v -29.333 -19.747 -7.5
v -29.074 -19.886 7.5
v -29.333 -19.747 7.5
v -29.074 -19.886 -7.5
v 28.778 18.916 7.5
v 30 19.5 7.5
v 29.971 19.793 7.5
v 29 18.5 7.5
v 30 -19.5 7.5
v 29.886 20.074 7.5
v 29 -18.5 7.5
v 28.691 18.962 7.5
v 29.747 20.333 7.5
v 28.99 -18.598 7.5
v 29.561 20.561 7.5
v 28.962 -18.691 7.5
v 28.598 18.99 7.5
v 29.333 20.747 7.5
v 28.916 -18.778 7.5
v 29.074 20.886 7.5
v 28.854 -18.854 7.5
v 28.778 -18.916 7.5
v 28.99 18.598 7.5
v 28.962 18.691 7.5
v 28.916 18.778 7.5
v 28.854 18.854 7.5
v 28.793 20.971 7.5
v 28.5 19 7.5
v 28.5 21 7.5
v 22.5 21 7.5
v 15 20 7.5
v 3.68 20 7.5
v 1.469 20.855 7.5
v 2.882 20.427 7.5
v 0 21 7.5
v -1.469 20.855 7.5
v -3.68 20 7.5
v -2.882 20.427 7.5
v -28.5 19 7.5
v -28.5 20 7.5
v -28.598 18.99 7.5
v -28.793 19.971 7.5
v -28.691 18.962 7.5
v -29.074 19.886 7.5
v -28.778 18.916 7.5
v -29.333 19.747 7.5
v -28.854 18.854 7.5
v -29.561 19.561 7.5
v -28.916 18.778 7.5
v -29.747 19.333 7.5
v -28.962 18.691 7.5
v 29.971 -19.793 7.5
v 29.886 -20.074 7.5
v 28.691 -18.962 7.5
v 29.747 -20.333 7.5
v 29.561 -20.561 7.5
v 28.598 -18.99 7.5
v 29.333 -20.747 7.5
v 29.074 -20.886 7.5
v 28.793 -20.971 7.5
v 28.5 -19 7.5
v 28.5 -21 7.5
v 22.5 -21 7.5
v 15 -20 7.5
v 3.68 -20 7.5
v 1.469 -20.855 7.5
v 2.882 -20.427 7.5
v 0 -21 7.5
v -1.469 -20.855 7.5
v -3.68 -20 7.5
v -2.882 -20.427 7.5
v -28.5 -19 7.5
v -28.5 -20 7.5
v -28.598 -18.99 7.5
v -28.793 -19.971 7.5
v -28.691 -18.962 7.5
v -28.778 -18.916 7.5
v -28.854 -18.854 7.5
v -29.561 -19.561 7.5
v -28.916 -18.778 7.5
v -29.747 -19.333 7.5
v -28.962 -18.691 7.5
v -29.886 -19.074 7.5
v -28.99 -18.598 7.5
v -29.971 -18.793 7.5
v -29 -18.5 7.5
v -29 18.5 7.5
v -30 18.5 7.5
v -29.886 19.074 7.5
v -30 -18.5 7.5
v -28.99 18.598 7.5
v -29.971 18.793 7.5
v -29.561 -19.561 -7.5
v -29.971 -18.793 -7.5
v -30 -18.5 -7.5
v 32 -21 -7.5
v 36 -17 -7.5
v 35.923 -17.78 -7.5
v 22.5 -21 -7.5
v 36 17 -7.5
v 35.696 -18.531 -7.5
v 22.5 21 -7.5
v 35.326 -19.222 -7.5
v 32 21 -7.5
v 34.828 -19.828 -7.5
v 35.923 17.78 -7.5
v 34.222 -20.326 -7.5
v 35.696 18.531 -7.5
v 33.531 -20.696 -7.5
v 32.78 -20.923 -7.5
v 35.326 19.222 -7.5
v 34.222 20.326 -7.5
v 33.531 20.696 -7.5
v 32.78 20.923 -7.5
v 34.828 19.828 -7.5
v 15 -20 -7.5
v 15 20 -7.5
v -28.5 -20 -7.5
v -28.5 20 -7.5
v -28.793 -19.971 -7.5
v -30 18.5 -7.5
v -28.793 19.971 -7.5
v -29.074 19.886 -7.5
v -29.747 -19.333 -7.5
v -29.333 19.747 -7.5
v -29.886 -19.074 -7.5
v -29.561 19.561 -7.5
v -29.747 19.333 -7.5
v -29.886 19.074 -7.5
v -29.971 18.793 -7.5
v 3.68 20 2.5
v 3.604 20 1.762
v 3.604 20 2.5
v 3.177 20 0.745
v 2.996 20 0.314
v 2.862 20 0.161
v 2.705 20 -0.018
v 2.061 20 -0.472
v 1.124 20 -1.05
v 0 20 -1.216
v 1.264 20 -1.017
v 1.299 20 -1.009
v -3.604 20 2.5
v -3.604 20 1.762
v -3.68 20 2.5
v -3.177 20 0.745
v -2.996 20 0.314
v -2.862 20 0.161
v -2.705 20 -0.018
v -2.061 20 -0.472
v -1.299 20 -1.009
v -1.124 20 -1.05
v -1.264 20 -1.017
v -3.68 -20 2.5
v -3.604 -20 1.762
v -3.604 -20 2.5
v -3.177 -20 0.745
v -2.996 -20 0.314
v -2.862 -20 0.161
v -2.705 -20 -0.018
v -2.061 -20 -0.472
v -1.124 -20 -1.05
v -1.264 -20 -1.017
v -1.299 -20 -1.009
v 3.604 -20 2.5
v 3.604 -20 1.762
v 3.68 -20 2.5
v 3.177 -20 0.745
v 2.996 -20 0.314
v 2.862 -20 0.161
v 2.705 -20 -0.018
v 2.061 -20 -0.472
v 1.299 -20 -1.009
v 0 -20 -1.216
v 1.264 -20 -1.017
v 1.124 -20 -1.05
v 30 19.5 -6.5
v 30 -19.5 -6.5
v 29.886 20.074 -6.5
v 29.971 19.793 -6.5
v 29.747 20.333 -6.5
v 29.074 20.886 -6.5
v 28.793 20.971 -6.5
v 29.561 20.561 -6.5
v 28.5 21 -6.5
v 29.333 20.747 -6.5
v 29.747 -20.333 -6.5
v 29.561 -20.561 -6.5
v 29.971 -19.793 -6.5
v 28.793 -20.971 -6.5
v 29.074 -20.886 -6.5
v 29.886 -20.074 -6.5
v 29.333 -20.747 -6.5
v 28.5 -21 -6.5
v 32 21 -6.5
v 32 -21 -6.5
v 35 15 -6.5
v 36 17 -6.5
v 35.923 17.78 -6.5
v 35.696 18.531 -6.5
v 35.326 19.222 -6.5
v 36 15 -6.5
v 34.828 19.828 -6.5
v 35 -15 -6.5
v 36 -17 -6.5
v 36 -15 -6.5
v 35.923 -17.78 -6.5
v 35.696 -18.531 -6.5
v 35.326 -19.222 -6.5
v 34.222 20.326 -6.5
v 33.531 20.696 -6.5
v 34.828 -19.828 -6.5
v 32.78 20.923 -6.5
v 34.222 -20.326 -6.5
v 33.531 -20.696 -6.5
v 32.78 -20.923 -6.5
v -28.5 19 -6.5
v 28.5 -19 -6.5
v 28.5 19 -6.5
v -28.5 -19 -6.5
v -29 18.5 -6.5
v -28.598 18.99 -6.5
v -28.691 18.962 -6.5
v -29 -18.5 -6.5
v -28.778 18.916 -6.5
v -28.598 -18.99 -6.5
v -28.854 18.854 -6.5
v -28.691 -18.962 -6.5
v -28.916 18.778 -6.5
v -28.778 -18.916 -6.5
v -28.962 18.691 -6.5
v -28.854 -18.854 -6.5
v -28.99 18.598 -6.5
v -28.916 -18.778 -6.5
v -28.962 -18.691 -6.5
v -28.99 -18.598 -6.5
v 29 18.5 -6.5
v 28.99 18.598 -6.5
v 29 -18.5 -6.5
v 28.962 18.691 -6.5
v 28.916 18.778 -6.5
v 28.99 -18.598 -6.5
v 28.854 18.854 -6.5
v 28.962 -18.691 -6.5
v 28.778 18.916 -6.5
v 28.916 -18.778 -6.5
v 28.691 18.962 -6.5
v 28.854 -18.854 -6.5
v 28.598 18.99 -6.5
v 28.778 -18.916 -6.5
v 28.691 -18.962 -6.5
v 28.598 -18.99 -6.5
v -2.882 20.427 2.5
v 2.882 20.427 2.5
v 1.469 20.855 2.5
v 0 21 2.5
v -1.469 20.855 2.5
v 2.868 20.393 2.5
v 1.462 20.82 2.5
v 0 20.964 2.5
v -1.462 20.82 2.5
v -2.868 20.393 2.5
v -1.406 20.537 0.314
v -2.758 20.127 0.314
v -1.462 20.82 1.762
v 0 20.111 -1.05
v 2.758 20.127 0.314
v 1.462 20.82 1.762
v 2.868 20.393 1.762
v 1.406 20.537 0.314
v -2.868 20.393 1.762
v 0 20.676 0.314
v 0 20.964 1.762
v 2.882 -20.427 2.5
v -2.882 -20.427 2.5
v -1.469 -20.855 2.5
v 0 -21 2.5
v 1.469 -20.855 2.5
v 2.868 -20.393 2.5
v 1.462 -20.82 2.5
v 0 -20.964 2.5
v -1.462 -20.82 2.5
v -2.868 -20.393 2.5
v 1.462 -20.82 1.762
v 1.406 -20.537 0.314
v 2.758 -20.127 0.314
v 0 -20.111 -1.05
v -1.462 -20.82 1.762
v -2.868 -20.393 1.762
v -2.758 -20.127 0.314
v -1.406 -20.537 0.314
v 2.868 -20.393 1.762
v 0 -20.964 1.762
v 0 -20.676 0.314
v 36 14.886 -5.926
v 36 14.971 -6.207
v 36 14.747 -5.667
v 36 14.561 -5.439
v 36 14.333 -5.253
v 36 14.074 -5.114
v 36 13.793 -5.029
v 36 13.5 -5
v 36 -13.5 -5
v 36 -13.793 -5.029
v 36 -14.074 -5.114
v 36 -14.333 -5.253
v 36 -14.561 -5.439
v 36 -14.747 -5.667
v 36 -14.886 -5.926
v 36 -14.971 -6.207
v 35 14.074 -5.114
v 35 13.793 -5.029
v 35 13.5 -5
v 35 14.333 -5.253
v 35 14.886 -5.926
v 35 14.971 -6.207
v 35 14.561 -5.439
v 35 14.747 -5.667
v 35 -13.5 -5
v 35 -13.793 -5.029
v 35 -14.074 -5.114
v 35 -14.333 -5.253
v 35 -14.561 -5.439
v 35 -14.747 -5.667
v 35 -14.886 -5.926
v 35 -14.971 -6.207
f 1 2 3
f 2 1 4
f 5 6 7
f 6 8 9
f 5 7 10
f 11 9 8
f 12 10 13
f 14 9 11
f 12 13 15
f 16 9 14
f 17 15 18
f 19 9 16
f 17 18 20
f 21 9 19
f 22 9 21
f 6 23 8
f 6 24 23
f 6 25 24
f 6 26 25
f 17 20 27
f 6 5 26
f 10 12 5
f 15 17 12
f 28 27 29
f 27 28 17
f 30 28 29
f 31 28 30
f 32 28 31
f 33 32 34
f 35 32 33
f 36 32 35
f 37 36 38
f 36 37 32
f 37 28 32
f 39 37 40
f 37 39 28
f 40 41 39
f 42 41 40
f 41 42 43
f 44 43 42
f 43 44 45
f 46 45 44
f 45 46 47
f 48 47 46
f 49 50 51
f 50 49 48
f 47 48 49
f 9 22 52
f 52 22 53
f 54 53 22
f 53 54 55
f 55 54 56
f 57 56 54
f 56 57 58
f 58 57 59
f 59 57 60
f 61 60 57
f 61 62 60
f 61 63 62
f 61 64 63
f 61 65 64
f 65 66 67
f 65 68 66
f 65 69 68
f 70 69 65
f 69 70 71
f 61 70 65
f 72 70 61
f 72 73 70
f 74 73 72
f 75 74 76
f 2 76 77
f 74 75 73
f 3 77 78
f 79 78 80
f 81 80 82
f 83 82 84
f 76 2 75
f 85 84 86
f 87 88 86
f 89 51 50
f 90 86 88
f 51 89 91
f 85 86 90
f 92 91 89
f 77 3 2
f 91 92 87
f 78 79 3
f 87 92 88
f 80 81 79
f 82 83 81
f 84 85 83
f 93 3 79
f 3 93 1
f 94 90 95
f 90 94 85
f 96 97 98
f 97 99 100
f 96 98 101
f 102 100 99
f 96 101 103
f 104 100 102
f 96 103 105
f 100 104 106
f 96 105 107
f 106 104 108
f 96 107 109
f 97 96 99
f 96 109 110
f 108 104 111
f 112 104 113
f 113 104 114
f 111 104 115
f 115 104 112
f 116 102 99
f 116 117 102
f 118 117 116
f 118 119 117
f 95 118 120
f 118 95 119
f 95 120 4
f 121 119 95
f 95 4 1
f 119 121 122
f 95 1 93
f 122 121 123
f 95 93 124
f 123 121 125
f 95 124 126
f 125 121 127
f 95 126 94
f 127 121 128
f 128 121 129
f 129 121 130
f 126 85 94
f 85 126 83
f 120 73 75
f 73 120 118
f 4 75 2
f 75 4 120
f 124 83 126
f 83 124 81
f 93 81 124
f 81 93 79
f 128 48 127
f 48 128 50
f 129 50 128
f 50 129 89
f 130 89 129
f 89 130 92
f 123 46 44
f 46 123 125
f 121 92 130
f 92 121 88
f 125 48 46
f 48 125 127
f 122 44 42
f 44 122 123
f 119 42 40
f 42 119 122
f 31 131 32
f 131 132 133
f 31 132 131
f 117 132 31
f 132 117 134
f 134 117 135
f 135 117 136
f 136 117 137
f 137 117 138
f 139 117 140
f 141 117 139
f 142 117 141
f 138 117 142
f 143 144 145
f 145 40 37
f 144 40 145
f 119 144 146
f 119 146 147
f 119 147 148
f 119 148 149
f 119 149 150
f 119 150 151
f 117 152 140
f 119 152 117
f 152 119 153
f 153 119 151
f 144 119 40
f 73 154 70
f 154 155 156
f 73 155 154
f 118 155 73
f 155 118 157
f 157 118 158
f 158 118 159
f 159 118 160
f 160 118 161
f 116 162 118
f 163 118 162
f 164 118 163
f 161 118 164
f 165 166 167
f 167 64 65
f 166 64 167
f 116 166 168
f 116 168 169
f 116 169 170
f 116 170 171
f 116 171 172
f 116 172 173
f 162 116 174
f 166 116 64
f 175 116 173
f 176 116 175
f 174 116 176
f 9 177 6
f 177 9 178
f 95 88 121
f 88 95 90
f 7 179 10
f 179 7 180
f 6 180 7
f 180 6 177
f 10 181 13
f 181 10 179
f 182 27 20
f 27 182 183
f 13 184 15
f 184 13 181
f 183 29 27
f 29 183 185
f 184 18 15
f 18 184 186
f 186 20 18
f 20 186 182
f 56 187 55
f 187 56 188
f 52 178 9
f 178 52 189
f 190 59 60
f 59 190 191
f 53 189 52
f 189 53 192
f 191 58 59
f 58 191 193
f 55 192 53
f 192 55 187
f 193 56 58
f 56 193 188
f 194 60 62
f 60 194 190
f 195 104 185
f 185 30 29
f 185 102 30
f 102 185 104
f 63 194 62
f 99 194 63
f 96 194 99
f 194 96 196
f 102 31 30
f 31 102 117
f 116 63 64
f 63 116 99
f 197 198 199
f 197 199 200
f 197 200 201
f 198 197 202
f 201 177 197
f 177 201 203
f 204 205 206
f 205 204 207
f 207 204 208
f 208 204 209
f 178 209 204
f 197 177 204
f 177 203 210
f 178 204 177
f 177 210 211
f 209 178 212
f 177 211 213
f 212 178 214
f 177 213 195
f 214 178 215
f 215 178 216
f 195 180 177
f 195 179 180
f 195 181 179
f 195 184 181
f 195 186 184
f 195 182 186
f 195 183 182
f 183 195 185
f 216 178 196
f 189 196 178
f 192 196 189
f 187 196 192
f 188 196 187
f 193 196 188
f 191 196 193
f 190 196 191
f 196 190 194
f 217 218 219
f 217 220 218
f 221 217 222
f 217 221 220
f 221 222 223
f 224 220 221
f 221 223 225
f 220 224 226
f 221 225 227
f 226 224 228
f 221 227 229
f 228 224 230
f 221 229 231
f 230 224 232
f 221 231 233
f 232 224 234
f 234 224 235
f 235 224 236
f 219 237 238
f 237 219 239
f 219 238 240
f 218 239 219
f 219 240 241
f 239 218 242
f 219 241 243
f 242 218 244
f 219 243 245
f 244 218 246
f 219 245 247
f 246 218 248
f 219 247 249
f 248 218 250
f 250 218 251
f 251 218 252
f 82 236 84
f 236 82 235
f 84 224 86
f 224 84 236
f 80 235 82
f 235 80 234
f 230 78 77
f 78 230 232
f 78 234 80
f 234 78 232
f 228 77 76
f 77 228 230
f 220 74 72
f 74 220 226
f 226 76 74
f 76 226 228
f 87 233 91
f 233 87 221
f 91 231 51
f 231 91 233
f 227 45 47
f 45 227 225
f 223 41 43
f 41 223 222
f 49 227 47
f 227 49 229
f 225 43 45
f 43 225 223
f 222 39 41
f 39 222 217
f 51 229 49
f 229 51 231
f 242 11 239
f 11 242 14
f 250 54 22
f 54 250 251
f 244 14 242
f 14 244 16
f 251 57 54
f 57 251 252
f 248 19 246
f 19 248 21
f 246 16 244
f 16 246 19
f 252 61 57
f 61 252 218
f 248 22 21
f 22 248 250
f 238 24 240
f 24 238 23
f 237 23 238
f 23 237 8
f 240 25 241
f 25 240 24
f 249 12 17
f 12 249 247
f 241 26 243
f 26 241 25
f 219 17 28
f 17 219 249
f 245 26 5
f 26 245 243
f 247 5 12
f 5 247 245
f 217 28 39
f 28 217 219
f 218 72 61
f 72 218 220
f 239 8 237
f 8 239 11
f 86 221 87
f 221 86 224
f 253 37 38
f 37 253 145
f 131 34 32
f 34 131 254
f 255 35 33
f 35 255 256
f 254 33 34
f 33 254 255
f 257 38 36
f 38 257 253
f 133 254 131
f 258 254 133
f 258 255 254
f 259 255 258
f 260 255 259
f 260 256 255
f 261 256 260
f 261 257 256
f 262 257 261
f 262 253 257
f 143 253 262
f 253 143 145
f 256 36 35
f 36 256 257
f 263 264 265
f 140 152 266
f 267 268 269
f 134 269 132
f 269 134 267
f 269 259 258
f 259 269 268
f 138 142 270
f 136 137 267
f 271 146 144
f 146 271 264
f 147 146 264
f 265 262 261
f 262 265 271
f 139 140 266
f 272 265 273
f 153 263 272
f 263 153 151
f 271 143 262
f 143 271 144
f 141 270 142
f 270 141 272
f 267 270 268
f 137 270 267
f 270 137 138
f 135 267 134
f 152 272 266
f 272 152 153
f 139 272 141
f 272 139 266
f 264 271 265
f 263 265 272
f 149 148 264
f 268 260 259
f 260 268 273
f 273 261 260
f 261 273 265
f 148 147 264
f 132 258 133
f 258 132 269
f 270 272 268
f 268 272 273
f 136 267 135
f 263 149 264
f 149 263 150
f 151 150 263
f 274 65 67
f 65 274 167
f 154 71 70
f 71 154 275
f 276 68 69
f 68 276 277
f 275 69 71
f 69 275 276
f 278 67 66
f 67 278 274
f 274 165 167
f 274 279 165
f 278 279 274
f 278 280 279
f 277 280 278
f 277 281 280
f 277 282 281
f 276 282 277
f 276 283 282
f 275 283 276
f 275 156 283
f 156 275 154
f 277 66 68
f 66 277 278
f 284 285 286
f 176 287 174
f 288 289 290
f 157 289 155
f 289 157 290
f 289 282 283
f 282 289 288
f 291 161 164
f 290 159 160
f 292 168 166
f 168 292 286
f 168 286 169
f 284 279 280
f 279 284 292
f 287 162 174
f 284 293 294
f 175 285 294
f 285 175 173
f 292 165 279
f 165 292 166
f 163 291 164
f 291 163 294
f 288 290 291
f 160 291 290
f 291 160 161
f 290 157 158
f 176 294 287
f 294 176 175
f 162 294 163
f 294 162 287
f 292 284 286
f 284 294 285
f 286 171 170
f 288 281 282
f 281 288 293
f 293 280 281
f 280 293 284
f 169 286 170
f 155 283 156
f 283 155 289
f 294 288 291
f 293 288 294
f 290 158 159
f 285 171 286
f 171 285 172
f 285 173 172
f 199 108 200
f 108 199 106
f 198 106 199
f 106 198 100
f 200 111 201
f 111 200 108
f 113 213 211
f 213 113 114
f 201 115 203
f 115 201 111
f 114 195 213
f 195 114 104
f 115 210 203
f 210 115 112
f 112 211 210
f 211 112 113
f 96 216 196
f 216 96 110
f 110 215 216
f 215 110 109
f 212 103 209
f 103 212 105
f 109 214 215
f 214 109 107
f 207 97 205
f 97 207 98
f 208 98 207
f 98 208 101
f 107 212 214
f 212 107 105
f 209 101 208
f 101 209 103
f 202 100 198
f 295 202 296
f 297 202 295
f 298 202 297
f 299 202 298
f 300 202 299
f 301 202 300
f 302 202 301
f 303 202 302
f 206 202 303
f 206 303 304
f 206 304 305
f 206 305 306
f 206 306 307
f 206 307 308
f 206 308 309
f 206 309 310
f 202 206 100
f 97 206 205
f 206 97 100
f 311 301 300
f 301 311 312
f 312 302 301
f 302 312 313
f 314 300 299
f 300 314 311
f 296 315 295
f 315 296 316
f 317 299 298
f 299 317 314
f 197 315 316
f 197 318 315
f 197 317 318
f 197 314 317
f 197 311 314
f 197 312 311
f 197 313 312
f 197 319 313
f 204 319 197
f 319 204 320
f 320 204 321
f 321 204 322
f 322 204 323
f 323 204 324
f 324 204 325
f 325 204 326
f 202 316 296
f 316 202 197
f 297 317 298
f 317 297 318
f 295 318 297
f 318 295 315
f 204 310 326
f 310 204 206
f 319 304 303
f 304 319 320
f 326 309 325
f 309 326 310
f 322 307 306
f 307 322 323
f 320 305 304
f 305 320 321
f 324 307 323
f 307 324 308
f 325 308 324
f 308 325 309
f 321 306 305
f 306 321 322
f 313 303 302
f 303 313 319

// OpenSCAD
/*
 * Radio Components Storage Cell
 *
 * Copyright (c) 2022 Alexei A. Smekalkine <ikle@ikle.ru>
 *
 * SPDX-License-Identifier: BSD-2-Clause
 */

use <MCAD/boxes.scad>

module hook (width = 5, height = 5, jump = 1, flange = 0.1)
{
	W = width;
	H = height;
	J = jump;
	T = flange;

	R  = W * W / (8*J) + J/2;
	D  = 2 * R;
	T2 = 2 * T;

	difference () {
		translate ([0, J - R, 0])
			union () {
				cylinder (h = H, r = R);
				sphere (R);
			}
		translate ([-R-T, -D, -R-T])
			cube ([D + T2, D, H + D + T2], false);
	}
}

module rbox (length = 30, width = 10, height = 2, radius = 7)
{
	L = length;
	W = width;
	H = height;
	R = radius;
	D = 2*R;

	BW = W - R;
	BL = L;

	SW = R;
	SL = L - D;
	SX = W/2 - SW;

	translate ([-W/2, -BL/2, -H/2]) cube ([BW, BL, H], false);
	translate ([SX,   -SL/2, -H/2]) cube ([SW, SL, H], false);

	difference () {
		union () {
			translate ([SX, +SL/2, -H/2]) cylinder (h = H, r = R);
			translate ([SX, -SL/2, -H/2]) cylinder (h = H, r = R);
		}
		translate ([-W/2-D, -L, -H]) cube ([D, 2*L, 2*H], false);
	}
}

module tbox (base1 = 25, base2 = 30, width = 30, height = 2, flange = 0.1)
{
	L1 = base1;
	L2 = base2;
	W  = width;
	H  = height;
	T  = flange;

	pts = [
		[-W, L1/2], [0, L2/2], [T, L2/2 - T],
		[T, T - L2/2], [0, -L2/2], [-W, -L1/2]
	];

	linear_extrude (height = H)
		polygon (pts);
}

module arm (width = 40, depth = 5, length = 10, thickness = 1, radius = 1)
{
	W = width;
	D = depth;
	L = length;
	T = thickness;
	R = radius;

	BW = D + L;

	translate ([BW/2 - D, 0, T/2]) rbox (W, BW, T, L * 2/3);

	/* hook */

	HL = W - 2*L;
	HW = (R + T) + T/2;

	translate ([L - T/2, 0, T/2])
		rotate ([0, -90, 0])
			translate ([HW/2, 0, 0])
				rbox (HL, HW, T, R + T);
}

module cell (width = 40, depth = 60, height = 15, thickness = 1, radius = .5,
	     arm = 6)
{
	W = width;
	D = depth;
	H = height;
	T = thickness;
	R = radius;

	HW = H/2;
	HH = H/3;
	HJ = T;

	difference () {
		union () {
			roundedBox ([D, W, H], R + T, true);
			translate ([D/2 - HW/2, 0, 0])
				rbox (W + 2*HJ, HW, H, R + T);
			translate ([D/2 - HW, 0, -H/2])
				tbox (W, W + 2*HJ, HW, H);
		}
		translate ([0, 0, T])
		roundedBox ([D - 2 * T, W - 2 * T, H], R, true);
	}

	translate ([0, +W/2, H/6]) hook (HW, HH, HJ);
	translate ([0, -W/2, H/6]) rotate ([0, 0, 180]) hook (HW, HH, HJ);

	AW = W + 2*HJ;
	AD = R + T;

	translate ([D/2, 0, -H/2]) arm (AW, AD, arm, T, R);
}

// $fa = 1; $fs = 0.4;
$fn = 32;

cell (40, 60, 15, 1, .5, 6);
